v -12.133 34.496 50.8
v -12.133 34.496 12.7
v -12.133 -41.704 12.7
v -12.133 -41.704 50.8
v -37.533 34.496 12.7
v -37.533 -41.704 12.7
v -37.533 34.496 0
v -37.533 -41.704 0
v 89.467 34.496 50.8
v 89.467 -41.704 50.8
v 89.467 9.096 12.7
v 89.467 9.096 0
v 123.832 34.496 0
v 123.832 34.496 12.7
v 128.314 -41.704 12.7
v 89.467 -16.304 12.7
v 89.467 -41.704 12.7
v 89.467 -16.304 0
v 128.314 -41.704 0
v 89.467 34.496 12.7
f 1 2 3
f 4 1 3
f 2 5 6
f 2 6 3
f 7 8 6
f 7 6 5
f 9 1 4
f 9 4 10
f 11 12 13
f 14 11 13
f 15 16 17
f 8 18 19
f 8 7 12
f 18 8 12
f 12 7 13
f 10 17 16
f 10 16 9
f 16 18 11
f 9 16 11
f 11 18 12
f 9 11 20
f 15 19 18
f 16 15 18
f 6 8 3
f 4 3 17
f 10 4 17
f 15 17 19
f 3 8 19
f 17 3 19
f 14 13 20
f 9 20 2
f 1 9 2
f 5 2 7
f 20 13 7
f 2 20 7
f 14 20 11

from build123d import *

# Parameters (mm, degrees)
F0_W     = 25.4
F0_H     = 76.2
F1_DEPTH = 12.7
F2_DEPTH = 50.8
F3_DEPTH = 12.7
F4_DEPTH = 12.7


with BuildPart() as f1:
    # F0 (on Top) → F1 (new body)
    with BuildSketch(Plane.XY):
        with Locations((-24.833125, -3.603618)):
            Rectangle(F0_W, F0_H)
    extrude(amount=F1_DEPTH)

    # F0 (on Top) → F2 (join)
    with BuildSketch(Plane.XY):
        Polygon((89.466875, 34.496382), (-12.133125, 34.496382), (-12.133125, -41.703618), (89.466875, -41.703618), (89.466875, -16.303618), (89.466875, 9.096382), align=None)
    extrude(amount=F2_DEPTH)

    # F0 (on Top) → F3 (join)
    with BuildSketch(Plane.XY):
        Polygon((123.831588, 34.496382), (89.466875, 34.496382), (89.466875, 9.096382), align=None)
    extrude(amount=F3_DEPTH)

    # F0 (on Top) → F4 (join)
    with BuildSketch(Plane.XY):
        Polygon((89.466875, -16.303618), (89.466875, -41.703618), (128.313944, -41.703618), align=None)
    extrude(amount=F4_DEPTH)


solid = f1.part
